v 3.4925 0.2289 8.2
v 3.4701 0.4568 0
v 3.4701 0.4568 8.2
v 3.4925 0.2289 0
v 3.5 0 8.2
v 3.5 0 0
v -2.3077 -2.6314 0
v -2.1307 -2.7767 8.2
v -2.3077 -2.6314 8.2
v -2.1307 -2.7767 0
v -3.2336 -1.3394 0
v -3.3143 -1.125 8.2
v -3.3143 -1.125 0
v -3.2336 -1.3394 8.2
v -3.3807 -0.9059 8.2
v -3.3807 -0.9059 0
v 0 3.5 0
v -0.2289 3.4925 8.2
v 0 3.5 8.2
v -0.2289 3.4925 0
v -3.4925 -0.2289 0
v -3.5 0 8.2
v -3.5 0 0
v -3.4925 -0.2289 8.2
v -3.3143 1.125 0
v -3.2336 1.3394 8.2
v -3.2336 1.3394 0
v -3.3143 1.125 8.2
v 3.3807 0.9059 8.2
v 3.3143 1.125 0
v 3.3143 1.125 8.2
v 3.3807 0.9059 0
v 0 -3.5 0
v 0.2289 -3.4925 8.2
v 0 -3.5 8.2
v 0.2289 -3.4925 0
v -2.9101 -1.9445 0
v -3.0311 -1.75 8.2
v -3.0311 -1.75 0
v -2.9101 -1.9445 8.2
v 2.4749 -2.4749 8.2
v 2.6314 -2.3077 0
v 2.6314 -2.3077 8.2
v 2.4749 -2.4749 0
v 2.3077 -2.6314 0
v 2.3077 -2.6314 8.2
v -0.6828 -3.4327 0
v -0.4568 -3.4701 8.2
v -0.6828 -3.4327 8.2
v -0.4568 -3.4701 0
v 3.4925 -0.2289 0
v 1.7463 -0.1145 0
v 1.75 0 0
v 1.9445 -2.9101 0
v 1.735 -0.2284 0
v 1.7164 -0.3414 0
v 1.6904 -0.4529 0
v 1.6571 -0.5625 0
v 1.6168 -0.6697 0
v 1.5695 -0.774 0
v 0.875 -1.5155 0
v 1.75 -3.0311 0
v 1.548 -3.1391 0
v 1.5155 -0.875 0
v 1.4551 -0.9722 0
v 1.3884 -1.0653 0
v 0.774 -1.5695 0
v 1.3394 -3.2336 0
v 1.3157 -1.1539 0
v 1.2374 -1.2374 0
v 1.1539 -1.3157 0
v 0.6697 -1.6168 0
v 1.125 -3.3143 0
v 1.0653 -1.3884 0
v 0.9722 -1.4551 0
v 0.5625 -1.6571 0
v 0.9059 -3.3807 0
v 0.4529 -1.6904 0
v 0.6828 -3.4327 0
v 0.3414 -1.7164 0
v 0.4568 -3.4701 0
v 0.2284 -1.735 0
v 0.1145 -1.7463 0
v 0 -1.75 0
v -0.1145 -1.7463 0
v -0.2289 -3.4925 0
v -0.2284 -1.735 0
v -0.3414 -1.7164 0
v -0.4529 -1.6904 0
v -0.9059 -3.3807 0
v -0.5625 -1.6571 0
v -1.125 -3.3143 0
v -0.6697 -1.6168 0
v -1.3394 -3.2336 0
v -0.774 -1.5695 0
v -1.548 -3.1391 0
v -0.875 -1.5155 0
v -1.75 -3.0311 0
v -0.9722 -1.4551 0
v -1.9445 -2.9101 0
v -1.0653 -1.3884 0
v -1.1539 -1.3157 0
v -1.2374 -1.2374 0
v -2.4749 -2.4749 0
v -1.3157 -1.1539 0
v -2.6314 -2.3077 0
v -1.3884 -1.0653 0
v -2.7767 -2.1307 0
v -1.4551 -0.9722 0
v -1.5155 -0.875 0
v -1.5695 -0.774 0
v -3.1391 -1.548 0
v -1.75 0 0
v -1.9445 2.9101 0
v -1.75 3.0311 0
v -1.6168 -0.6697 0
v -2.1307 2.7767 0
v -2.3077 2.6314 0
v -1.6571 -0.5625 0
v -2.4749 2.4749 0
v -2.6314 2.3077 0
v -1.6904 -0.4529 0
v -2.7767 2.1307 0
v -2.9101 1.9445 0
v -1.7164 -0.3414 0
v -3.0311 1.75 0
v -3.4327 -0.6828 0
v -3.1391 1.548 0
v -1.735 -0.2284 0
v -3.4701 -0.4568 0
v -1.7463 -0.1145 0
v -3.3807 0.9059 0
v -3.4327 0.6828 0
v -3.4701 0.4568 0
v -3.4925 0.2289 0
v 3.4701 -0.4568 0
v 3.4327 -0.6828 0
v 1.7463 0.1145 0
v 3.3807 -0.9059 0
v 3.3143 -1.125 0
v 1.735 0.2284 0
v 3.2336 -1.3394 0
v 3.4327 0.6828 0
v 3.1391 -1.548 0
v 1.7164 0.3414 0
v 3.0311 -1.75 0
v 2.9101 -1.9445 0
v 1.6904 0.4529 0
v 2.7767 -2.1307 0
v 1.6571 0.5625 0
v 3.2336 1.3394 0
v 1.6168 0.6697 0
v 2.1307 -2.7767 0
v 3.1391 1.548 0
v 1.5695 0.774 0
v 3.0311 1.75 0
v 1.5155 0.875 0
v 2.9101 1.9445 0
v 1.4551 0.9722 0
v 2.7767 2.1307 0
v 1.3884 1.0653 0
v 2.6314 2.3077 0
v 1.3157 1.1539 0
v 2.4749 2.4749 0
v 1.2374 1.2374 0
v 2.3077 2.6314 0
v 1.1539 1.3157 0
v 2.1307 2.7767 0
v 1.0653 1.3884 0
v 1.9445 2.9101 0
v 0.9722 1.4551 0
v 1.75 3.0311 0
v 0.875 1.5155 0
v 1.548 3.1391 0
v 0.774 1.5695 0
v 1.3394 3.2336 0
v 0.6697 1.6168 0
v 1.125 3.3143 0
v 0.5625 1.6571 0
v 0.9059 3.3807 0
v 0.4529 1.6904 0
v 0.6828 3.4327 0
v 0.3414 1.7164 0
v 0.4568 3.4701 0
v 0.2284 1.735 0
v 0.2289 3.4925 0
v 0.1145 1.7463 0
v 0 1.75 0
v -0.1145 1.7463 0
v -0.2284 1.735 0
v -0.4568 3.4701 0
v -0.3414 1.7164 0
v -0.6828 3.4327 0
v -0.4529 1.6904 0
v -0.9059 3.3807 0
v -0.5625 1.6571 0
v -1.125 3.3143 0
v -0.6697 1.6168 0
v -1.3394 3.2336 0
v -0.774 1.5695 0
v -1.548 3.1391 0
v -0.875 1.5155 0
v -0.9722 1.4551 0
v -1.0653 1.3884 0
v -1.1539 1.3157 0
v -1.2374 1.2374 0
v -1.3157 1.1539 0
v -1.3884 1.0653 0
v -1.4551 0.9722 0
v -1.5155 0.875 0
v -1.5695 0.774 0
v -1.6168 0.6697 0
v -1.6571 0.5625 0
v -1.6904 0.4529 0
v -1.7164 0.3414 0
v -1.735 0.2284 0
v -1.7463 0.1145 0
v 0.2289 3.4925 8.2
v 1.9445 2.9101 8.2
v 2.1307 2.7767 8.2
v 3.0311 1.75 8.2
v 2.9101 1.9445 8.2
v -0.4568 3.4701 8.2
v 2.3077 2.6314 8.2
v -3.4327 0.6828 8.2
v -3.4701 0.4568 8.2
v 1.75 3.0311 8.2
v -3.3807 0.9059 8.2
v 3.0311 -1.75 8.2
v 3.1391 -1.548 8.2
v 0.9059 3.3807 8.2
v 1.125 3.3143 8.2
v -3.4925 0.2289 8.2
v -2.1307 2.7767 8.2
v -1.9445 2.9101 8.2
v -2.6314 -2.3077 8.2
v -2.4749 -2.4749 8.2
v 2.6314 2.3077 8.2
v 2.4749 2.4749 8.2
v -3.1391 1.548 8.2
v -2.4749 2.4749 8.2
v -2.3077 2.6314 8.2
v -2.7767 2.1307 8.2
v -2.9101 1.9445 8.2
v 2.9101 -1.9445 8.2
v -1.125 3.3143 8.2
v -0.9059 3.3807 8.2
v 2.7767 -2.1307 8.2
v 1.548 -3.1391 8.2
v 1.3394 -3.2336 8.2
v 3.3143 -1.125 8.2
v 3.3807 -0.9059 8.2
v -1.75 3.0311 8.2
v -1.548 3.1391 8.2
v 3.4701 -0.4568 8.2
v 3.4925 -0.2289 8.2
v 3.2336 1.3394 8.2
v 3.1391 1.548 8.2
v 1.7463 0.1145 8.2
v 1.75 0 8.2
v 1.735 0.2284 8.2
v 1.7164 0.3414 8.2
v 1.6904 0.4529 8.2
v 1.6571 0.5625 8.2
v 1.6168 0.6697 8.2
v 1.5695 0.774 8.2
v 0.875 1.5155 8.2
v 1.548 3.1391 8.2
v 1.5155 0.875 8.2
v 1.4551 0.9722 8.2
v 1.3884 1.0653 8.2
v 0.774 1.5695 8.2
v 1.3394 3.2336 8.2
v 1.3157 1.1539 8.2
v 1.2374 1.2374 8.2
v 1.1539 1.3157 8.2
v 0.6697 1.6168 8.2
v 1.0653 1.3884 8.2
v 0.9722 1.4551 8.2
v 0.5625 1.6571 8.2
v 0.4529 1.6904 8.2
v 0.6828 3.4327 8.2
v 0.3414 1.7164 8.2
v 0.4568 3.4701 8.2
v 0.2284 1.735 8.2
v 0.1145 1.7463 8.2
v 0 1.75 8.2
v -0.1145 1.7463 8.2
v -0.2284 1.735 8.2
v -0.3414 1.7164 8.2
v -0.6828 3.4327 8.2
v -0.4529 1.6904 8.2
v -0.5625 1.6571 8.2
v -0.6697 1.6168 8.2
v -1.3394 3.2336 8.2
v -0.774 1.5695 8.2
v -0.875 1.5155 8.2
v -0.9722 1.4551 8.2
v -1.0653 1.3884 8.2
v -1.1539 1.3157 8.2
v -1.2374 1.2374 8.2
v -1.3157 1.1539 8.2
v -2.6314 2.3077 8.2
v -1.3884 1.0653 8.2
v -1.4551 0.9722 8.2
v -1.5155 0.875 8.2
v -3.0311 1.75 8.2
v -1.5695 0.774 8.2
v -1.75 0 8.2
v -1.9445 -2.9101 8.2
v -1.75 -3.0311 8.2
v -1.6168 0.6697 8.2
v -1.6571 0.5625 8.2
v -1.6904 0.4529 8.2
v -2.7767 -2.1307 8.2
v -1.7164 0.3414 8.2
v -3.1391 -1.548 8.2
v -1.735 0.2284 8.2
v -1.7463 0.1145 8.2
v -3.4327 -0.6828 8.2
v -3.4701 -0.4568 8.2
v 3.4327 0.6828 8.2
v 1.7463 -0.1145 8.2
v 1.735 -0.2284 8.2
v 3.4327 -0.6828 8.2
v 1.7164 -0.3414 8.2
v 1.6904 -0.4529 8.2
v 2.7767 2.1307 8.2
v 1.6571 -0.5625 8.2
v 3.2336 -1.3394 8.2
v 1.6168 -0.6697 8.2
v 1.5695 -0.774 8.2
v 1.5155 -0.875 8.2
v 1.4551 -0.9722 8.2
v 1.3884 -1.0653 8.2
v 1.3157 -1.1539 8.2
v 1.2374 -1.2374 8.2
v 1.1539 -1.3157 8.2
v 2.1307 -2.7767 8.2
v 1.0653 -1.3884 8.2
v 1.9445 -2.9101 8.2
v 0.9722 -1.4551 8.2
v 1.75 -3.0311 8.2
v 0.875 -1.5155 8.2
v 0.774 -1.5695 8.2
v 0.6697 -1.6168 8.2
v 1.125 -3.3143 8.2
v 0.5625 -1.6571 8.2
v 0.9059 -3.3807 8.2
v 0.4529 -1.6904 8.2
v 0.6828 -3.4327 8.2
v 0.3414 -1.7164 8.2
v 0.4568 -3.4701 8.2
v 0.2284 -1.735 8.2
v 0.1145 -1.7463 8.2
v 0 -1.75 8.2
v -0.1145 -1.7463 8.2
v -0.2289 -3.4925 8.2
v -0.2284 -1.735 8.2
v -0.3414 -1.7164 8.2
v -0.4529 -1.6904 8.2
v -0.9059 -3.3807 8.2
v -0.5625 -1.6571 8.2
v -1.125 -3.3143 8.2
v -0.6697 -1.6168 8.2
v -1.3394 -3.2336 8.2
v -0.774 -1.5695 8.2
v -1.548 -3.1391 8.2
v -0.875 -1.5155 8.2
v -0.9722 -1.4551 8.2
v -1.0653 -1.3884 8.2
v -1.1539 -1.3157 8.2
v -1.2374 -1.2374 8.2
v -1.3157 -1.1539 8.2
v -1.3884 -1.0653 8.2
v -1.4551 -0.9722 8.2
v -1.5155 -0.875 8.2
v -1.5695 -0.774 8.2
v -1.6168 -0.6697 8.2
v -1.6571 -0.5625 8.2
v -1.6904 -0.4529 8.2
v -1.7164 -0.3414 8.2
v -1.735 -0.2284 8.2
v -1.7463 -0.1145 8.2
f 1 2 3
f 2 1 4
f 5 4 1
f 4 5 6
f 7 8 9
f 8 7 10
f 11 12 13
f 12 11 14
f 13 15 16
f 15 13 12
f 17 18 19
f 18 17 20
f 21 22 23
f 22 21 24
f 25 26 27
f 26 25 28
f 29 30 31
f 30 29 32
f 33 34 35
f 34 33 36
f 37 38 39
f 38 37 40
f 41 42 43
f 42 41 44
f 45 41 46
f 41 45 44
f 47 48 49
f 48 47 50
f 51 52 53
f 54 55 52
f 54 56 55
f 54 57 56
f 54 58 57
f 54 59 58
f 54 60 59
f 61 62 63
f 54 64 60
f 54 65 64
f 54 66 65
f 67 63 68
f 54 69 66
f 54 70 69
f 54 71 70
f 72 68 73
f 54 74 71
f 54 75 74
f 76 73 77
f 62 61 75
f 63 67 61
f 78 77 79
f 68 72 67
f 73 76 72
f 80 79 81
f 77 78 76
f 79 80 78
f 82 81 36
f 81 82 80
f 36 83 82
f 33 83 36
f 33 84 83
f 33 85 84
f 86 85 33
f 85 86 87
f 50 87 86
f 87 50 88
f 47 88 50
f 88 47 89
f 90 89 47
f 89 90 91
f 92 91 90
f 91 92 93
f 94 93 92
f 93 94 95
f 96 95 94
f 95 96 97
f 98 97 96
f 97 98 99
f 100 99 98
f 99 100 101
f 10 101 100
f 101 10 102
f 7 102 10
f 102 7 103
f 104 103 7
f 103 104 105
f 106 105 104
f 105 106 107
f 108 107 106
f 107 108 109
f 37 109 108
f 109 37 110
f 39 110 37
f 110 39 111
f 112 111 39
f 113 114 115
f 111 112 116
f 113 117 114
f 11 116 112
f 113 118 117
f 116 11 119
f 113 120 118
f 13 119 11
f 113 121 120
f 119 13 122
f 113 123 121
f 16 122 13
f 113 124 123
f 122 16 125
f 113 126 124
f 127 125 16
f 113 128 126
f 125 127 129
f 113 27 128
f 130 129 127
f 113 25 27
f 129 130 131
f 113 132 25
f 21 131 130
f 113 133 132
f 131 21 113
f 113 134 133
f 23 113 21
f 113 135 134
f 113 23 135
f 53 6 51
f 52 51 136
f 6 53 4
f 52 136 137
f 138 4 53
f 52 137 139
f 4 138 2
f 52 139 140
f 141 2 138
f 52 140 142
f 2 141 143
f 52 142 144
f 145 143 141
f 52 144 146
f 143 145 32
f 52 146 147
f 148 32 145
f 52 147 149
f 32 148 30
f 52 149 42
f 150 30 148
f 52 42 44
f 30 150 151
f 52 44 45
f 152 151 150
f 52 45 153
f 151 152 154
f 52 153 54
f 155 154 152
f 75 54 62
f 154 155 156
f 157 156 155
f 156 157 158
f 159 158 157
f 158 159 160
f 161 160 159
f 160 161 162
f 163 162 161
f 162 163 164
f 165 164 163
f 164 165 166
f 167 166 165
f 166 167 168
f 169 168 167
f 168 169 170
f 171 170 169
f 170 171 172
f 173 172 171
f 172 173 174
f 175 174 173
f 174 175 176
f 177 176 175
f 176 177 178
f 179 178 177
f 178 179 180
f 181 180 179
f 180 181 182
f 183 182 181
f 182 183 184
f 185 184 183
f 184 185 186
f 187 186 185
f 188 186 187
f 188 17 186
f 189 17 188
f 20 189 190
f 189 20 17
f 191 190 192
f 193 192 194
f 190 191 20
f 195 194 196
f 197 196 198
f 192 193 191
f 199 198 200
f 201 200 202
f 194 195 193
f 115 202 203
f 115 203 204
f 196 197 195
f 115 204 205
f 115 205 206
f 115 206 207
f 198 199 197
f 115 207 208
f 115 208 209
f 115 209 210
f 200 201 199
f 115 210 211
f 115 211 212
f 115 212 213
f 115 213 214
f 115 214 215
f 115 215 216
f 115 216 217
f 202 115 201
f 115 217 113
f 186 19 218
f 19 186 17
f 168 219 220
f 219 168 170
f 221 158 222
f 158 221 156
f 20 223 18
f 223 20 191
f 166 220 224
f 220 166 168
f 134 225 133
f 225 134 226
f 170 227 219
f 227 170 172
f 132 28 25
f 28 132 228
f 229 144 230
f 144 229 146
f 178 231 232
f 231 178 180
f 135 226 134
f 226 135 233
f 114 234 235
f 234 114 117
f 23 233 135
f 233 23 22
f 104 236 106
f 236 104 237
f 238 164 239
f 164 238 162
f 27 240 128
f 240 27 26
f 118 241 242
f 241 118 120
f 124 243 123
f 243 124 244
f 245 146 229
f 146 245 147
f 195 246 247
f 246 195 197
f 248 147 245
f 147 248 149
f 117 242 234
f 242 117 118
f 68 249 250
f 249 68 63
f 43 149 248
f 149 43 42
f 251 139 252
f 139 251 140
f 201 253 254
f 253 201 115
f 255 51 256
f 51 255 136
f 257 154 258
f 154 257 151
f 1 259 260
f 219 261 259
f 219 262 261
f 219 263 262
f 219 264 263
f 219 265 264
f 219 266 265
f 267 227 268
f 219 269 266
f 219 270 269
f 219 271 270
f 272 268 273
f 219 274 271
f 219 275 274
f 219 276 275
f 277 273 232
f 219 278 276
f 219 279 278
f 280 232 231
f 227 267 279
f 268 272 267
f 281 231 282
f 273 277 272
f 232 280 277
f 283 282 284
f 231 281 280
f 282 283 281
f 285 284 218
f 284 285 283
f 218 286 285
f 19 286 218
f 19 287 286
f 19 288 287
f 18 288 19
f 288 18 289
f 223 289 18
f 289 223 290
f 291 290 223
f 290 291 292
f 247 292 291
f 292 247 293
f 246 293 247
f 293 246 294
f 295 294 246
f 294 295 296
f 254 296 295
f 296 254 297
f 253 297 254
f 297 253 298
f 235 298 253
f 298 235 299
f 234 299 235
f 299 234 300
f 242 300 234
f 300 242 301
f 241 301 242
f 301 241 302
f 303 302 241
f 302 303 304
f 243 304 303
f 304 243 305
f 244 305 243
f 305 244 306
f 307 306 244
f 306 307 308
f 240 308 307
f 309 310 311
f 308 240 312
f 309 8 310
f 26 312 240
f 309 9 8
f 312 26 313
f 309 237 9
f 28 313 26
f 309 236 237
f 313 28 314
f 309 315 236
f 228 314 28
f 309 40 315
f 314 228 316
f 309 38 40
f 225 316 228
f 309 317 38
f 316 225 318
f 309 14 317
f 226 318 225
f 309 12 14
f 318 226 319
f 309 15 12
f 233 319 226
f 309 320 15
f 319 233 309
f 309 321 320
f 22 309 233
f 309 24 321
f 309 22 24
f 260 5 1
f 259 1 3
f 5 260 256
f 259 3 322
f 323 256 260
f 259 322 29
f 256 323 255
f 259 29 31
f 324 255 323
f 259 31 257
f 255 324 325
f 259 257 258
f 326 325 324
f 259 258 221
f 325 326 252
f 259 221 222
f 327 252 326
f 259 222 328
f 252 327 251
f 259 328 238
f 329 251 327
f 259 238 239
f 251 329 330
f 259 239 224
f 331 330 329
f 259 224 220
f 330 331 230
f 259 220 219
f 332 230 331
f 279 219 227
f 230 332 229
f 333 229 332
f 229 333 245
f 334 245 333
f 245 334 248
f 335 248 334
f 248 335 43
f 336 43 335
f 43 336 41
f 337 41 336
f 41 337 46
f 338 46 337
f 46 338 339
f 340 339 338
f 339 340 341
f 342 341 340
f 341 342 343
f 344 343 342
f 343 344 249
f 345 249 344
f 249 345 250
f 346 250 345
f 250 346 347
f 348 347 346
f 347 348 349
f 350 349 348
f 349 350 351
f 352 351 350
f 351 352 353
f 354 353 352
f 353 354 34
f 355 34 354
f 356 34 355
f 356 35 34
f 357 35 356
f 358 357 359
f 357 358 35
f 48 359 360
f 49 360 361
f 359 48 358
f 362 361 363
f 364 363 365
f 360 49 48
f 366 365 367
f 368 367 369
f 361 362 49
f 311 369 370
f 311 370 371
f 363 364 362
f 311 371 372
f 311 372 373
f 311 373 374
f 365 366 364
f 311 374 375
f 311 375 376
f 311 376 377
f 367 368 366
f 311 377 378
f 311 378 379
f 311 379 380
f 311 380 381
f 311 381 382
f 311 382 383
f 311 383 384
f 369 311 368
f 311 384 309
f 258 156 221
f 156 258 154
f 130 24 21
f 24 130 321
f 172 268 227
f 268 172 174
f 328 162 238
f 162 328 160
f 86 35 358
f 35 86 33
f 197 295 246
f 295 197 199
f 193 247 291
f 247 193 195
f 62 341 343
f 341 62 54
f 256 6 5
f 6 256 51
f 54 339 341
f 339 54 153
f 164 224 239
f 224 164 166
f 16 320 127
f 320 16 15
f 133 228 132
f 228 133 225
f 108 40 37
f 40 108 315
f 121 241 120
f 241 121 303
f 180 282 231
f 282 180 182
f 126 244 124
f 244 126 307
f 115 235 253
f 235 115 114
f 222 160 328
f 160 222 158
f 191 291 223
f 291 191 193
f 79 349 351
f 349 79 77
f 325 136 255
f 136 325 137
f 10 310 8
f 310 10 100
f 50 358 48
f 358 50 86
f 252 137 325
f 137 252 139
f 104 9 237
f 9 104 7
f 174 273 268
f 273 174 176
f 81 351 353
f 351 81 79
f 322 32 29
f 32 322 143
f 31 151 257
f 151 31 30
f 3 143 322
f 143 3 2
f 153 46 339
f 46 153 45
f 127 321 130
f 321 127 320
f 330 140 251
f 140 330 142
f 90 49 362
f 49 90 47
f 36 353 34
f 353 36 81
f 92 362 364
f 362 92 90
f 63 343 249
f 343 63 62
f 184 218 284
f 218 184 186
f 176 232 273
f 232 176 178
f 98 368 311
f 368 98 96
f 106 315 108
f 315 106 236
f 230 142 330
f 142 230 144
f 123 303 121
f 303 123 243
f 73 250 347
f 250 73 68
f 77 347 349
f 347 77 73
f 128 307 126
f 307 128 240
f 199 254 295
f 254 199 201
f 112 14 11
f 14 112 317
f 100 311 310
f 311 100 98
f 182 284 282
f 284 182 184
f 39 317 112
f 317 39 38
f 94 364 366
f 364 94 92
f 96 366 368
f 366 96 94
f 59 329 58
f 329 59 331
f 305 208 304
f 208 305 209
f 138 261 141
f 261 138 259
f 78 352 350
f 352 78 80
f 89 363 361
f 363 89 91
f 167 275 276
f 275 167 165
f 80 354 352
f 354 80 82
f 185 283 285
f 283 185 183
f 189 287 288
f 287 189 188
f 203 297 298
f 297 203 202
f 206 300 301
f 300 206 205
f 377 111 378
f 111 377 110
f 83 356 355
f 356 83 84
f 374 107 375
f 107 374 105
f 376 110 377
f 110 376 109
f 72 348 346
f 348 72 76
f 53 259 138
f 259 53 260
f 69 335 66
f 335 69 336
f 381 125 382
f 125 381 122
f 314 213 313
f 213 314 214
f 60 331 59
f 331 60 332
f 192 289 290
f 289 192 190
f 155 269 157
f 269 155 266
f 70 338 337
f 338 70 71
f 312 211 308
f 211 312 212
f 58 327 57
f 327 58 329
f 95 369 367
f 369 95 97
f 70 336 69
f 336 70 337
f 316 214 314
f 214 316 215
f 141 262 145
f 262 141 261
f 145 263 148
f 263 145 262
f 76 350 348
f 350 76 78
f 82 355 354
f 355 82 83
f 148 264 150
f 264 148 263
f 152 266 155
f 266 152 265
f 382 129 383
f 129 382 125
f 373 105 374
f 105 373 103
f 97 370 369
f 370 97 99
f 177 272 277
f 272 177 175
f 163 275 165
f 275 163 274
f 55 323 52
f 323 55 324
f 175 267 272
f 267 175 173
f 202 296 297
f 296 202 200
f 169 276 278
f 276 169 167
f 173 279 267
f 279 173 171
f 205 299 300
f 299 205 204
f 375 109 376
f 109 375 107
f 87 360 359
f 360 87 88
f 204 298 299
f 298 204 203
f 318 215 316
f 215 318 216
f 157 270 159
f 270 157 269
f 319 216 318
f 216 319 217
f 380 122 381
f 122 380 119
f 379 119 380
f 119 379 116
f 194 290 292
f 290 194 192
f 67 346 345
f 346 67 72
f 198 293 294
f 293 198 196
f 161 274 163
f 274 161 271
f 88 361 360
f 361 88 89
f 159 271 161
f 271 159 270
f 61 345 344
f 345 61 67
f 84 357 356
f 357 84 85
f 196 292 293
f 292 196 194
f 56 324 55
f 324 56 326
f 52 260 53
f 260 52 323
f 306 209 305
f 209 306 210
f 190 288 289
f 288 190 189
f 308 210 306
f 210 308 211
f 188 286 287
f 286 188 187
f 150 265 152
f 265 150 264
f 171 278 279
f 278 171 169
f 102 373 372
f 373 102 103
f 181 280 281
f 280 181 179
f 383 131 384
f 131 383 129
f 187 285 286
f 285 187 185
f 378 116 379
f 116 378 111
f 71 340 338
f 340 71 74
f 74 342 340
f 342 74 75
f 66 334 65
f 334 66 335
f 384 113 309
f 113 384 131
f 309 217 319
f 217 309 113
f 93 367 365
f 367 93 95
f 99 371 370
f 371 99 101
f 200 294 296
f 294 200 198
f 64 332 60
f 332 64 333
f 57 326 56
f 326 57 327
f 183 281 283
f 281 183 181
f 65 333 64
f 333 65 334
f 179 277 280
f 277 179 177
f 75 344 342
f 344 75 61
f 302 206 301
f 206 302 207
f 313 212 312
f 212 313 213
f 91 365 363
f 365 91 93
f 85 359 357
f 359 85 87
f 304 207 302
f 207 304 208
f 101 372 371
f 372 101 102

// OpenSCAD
// file: ../print_fit.scad
// Print-fit clearances, shared by every printed part's `config="revised"`.
//
// A printed part comes off the machine slightly oversize, so a feature drawn
// line-to-line against what it mates with will not go together. Each mating
// feature is drawn at its mate's nominal size plus or minus one of two
// clearances, per side, chosen by what the mate is:
//
//     FIT_PRESS    a bought part the printed one is seated on, located by
//                  or bonded to: bearings, motors, splines, CF rods, tubes
//                  and strakes
//     FIT_SLIP     another printed part, and every fastener's clearance:
//                  screw holes, nut traps and pockets
//
// A third class is not a fit, because its surfaces never meet:
//
//     FIT_RUN      a gap between two parts that turn past each other and
//                  must never touch, such as a housing and a gear's teeth
//
// The classes, their members and exclusions, and how a machine is qualified
// against these values are owned by specs/007.2 § Print fits; the coupon that
// qualifies them is 950-Tooling/fit_coupon.scad.
//
// Every part `include`s this file, so `-D FIT_SLIP=...` reaches a single
// render, and an edit here retunes every part. `config="previous"` draws at
// zero clearance: it is the reference mesh, and its dist gate measures it.

FIT_SLIP  = 0.15;
FIT_PRESS = 0.05;
FIT_RUN   = 0.50;

// A hole or bore that takes a mate of diameter d, and a pin or shaft that
// goes into one, with clearance c per side.
function fit_bore(d, c) = d + 2 * c;
function fit_pin(d, c) = d - 2 * c;

// The clearances a part draws in configuration cfg: [slip, press, run].
function fit_clearances(cfg) =
    cfg == "previous" ? [0, 0, 0] : [FIT_SLIP, FIT_PRESS, FIT_RUN];
// main file
// #800-007 PCB Spacer — parametric source.
// A plain tube that holds the FPGA board off the Motor Control Board, between
// the two boards (008.10 step 4). An M3x20 bolt passes through its bore.
//
//   config = "previous" — a faithful recreation of the reference mesh
//                         (../Reference/meshes/800-Harness/).
//   config = "revised"  — identical to "previous"; see FITS.
//
// FRAME. The axis is on +Z through the origin, the part from z = 0 to 8.2.
// The reference mesh is already in this frame.
//
// Measured from the reference (scadmesh), feature IDs as in
// 800-007_PCBSpacer.view.json:
//
//     ID  feature   value
//     S1  body      Ø7.000, z 0 .. 8.2
//     B1  bore      Ø3.500, through
//
// CONSTRUCTION. One tube: a cylinder less its bore, the bore overrunning both
// ends so the faces stay clean.
//
// FITS (../print_fit.scad):
//
//     B1, on the M3x20 bolt (Ø3.0)    slip, which asks for Ø3.3
//
// The reference's Ø3.5 is already wider than the slip fit, so "revised" keeps
// it; probes-800-007-wide in render.json pins it.

include <../print_fit.scad>

/* [Configuration] */
// Parameter set: previous (reference) or revised
config = "previous"; // [previous, revised]

/* [Hidden] */
$fn = 96;
OUTER_D = 7.000;   // S1
BORE_D  = 3.500;   // B1
HEIGHT  = 8.200;

module pcb_spacer() difference() {
    cylinder(d = OUTER_D, h = HEIGHT);
    translate([0, 0, -1]) cylinder(d = BORE_D, h = HEIGHT + 2);
}

pcb_spacer();
